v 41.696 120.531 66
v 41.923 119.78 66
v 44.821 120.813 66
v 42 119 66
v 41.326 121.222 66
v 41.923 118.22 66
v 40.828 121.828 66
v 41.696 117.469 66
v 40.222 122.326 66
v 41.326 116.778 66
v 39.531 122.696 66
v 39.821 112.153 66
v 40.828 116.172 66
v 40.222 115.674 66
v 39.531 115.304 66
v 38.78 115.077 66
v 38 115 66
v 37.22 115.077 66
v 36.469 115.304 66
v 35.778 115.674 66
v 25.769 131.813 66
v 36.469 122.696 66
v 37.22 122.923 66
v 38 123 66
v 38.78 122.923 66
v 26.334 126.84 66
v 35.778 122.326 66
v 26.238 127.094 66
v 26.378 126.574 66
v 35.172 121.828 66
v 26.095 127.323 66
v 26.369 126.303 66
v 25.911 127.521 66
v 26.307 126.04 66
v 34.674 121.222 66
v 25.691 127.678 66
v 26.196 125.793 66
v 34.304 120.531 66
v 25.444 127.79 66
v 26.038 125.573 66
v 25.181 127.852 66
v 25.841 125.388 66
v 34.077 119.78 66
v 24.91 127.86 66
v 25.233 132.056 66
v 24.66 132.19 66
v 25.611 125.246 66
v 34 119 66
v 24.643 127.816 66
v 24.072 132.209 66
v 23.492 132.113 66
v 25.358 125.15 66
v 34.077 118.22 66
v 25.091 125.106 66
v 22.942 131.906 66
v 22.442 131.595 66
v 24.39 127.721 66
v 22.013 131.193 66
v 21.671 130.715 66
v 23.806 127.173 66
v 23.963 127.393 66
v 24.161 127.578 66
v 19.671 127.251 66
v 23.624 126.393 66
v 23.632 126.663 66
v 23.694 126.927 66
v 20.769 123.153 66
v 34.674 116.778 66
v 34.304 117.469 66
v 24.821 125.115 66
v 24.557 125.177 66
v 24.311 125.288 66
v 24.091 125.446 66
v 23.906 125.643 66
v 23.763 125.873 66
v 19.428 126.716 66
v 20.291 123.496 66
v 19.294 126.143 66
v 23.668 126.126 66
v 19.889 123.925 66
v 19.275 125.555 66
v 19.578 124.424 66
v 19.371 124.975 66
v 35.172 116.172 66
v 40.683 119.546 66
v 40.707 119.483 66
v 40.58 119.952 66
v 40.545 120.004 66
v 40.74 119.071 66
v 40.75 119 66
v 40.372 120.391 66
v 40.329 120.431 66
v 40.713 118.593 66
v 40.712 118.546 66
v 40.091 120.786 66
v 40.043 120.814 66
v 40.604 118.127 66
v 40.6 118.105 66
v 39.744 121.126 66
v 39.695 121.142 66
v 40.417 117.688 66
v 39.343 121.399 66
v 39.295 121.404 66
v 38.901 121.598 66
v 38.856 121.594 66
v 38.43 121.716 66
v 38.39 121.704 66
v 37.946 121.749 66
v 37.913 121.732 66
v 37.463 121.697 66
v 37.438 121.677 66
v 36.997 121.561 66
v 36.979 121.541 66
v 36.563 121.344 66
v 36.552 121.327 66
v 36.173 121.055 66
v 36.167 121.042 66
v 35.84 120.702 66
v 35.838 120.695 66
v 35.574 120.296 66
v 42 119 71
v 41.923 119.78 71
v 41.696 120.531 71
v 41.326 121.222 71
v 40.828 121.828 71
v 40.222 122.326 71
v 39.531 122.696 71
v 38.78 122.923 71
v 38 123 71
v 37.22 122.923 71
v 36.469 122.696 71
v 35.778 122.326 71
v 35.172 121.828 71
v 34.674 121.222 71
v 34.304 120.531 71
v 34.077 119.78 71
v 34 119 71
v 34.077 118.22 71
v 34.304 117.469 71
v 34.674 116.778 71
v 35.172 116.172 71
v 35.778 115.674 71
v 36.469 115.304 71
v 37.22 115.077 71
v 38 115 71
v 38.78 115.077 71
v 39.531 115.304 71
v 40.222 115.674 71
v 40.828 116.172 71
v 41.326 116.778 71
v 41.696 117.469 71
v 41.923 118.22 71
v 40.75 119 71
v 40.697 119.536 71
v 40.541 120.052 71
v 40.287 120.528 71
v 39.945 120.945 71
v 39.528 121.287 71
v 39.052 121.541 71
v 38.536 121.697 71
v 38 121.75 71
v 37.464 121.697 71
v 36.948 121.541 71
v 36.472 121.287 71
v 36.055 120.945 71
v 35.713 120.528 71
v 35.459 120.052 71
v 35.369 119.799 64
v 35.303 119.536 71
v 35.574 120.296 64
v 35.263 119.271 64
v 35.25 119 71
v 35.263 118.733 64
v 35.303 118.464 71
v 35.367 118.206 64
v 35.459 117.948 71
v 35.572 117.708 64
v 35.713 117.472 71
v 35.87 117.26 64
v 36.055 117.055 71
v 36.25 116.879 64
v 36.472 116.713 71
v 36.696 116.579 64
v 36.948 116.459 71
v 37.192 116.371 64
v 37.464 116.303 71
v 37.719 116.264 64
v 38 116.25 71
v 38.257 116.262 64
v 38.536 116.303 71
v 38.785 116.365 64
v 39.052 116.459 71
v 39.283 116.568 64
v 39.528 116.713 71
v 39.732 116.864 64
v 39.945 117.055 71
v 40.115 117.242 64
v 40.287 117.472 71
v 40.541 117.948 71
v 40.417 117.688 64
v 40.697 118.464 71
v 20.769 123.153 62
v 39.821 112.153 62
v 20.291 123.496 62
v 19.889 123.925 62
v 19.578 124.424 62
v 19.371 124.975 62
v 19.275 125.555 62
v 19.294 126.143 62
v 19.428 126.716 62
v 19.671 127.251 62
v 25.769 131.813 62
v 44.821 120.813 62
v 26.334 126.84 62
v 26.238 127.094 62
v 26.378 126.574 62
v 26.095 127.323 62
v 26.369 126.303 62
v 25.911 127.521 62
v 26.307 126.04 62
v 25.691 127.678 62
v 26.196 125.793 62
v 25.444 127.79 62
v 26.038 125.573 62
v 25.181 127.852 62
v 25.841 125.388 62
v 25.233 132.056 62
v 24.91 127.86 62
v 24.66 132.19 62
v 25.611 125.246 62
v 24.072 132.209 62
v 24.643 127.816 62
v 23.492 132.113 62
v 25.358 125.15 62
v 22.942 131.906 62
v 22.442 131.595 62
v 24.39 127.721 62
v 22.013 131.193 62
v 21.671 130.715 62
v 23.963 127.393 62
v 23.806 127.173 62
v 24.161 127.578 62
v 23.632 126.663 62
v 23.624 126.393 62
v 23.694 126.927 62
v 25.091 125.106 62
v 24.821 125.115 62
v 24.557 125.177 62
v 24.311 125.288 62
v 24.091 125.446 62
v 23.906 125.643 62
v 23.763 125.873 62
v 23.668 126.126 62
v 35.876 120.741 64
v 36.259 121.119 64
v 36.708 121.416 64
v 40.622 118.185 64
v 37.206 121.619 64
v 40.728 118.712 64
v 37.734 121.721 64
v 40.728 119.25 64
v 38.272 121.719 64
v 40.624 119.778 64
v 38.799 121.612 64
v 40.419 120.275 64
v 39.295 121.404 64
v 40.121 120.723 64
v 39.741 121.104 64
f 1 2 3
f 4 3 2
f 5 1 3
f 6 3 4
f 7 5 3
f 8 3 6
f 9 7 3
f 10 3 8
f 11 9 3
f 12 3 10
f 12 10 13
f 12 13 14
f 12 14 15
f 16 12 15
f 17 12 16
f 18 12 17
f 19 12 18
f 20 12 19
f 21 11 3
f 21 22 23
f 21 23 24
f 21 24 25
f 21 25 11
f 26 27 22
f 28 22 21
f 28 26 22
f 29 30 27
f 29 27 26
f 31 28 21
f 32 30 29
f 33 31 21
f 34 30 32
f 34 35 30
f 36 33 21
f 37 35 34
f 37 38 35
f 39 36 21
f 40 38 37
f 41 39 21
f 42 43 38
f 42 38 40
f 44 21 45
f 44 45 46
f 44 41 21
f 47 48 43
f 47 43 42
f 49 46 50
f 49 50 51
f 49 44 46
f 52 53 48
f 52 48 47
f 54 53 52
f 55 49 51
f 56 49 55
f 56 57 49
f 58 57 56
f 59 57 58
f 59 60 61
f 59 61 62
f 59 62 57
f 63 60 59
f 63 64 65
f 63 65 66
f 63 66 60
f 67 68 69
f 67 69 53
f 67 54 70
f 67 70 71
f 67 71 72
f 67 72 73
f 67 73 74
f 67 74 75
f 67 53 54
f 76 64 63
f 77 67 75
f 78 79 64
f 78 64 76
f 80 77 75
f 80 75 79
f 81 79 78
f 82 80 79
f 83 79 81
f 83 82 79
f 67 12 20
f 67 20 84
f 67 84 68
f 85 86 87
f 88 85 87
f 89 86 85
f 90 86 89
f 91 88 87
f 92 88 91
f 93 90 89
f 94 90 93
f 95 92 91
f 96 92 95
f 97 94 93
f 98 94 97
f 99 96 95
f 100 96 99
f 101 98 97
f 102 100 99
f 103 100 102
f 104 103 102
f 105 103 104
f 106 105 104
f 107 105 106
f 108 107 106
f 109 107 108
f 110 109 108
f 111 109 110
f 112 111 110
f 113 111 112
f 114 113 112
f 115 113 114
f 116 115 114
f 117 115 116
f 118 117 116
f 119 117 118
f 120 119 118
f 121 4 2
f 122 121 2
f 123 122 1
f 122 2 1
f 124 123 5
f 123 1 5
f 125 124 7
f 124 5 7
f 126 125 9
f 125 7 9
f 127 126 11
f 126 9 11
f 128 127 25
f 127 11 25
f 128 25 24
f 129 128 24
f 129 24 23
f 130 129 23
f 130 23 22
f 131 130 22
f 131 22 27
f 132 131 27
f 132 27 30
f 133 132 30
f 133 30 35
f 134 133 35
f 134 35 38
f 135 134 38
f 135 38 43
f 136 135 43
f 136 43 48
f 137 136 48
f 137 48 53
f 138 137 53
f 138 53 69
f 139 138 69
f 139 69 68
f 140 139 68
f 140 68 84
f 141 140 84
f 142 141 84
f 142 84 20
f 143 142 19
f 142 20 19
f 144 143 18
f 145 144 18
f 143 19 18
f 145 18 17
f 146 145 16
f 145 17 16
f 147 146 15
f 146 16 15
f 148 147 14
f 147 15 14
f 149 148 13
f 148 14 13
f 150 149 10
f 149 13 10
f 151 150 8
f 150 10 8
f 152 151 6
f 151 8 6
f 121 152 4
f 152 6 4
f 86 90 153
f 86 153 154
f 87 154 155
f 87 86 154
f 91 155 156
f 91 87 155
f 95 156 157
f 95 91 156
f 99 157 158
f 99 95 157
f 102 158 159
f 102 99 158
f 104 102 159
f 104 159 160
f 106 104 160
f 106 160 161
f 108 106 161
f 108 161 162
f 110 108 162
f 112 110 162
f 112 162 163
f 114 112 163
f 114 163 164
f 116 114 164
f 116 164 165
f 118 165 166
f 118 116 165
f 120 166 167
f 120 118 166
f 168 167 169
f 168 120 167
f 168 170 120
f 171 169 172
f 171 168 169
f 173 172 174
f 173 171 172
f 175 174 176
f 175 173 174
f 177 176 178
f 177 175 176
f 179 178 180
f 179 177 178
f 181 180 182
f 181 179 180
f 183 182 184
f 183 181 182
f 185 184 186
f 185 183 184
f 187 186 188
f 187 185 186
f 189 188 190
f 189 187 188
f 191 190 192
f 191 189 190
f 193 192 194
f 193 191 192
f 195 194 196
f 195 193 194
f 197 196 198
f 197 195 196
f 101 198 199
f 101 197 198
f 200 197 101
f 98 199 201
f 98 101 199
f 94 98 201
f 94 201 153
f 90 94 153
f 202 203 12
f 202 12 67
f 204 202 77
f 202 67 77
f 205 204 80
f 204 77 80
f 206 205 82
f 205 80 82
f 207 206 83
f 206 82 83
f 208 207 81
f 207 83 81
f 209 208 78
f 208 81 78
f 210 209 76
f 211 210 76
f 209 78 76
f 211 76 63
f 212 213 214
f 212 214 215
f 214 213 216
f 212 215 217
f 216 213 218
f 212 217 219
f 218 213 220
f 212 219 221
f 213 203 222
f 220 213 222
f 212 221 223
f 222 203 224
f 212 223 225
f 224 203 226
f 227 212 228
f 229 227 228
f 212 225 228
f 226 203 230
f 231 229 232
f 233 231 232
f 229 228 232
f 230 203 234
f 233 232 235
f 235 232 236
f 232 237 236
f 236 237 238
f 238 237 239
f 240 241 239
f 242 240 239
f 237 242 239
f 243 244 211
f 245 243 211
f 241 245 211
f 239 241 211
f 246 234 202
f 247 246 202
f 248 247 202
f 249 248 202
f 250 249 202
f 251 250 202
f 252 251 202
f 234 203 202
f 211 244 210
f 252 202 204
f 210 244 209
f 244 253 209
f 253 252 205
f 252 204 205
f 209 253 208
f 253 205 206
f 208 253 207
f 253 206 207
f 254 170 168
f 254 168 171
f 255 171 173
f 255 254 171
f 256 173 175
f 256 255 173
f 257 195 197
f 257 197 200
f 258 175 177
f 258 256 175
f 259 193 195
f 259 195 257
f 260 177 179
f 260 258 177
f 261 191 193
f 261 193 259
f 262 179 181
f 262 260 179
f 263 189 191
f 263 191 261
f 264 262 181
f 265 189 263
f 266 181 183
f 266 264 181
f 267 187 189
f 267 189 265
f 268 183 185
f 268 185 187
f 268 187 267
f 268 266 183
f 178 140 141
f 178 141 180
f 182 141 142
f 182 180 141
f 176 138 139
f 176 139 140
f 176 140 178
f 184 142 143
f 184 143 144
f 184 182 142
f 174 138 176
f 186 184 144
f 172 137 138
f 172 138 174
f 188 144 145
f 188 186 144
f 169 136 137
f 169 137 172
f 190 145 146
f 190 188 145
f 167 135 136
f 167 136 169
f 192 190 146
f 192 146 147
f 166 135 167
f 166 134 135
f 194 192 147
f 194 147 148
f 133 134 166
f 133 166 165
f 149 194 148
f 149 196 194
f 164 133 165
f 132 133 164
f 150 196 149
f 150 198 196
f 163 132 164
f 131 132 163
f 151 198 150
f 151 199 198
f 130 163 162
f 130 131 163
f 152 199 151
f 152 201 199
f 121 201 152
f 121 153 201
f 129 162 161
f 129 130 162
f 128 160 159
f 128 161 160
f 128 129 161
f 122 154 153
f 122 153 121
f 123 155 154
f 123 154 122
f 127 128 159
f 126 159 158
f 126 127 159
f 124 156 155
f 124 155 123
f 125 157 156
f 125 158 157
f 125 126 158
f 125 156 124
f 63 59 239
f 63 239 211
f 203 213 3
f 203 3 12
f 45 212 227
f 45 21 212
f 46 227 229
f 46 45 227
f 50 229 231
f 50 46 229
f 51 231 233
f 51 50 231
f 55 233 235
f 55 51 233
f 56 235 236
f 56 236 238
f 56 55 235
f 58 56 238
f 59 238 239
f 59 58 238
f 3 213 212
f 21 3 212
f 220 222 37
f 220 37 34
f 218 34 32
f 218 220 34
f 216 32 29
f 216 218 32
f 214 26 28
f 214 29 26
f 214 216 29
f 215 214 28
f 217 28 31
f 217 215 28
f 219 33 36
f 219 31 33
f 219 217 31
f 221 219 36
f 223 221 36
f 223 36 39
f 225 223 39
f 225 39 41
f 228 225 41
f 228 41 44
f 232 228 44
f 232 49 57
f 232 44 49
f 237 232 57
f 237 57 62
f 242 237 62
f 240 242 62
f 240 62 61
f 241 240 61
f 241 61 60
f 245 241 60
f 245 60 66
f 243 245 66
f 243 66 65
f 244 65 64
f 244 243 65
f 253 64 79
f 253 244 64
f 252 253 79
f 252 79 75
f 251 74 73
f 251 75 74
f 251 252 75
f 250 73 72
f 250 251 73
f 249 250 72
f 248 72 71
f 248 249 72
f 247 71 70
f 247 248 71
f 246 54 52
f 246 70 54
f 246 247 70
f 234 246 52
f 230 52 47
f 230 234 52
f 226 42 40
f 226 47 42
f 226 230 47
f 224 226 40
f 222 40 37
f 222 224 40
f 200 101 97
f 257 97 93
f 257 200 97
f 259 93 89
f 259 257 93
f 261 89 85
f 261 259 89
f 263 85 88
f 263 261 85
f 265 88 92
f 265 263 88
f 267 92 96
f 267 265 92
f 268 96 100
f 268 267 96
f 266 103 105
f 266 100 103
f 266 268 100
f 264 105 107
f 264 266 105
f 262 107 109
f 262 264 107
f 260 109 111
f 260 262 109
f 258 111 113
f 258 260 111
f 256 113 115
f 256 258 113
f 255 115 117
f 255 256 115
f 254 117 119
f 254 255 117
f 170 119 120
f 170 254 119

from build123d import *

# Parameters (mm, degrees)
CYLINDER081_R          = 2.75
CYLINDER081_DEPTH      = 7
CYLINDER078_R          = 4
CYLINDER078_DEPTH      = 9
CYLINDER071_R          = 1.38
CYLINDER071_DEPTH      = 10
CYLINDER069_R          = 2.75
CYLINDER069_DEPTH      = 10
BOX039_W               = 25
BOX039_H               = 10
BOX039_DEPTH           = 4
CUT049_PLACEMENT_ANGLE = 30
FILLET006_R            = 3


with BuildPart() as cilindro002:
    # Cylinder081 → Cylinder081 (new body)
    with BuildSketch(Plane(origin=(17, 17, 12), x_dir=(1, 0, 0), z_dir=(0, 0, 1))):
        Circle(CYLINDER081_R)
    extrude(amount=CYLINDER081_DEPTH)


with BuildPart() as extensi_n_servo:
    # Cylinder078 → Cylinder078 (new body)
    with BuildSketch(Plane(origin=(17, 17, 10), x_dir=(1, 0, 0), z_dir=(0, 0, 1))):
        Circle(CYLINDER078_R)
    extrude(amount=CYLINDER078_DEPTH)

    # Cut053: cut Cilindro002
    add(cilindro002.part, mode=Mode.SUBTRACT)


with BuildPart() as extensi_n_servo_1:
    # Cut053 placement: moved
    add(extensi_n_servo.part.moved(Location((21, 102, 52))))


with BuildPart() as cylinder071:
    # Cylinder071 → Cylinder071 (new body)
    with BuildSketch(Plane(origin=(25, 52, 59), x_dir=(1, 0, 0), z_dir=(0, 0, 1))):
        Circle(CYLINDER071_R)
    extrude(amount=CYLINDER071_DEPTH)


with BuildPart() as cylinder069:
    # Cylinder069 → Cylinder069 (new body)
    with BuildSketch(Plane(origin=(40, 52, 59), x_dir=(1, 0, 0), z_dir=(0, 0, 1))):
        Circle(CYLINDER069_R)
    extrude(amount=CYLINDER069_DEPTH)


with BuildPart() as fusion009:
    # Box039 → Box039 (new body)
    with BuildSketch(Plane(origin=(45, 57, 62), x_dir=(-1, 0, 0), z_dir=(0, 0, 1))):
        with Locations((12.5, 5)):
            Rectangle(BOX039_W, BOX039_H)
    extrude(amount=BOX039_DEPTH)

    # Cut046: cut Cylinder069
    add(cylinder069.part, mode=Mode.SUBTRACT)

    # Cut049: cut Cylinder071
    add(cylinder071.part, mode=Mode.SUBTRACT)


with BuildPart() as fusion009_1:
    # Cut049 placement: moved
    add(fusion009.part.moved(Location((-20.65, 26.95, 0))).rotate(Axis((-20.65, 26.95, 0), (0, 0, -1)), CUT049_PLACEMENT_ANGLE))

    # Fillet006
    fillet006_edges = [fusion009_1.edges().sort_by_distance(p)[0] for p in [
        (25.170508, 66.313448, 64),
        (20.170508, 57.653194, 64),
    ]]
    fillet(fillet006_edges, radius=FILLET006_R)


with BuildPart() as fusion009_2:
    # Fillet006 placement: moved
    add(fusion009_1.part.moved(Location((-2, 67, 0))))

    # Fusion009: union Extensión servo
    add(extensi_n_servo_1.part)


solid = fusion009_2.part
